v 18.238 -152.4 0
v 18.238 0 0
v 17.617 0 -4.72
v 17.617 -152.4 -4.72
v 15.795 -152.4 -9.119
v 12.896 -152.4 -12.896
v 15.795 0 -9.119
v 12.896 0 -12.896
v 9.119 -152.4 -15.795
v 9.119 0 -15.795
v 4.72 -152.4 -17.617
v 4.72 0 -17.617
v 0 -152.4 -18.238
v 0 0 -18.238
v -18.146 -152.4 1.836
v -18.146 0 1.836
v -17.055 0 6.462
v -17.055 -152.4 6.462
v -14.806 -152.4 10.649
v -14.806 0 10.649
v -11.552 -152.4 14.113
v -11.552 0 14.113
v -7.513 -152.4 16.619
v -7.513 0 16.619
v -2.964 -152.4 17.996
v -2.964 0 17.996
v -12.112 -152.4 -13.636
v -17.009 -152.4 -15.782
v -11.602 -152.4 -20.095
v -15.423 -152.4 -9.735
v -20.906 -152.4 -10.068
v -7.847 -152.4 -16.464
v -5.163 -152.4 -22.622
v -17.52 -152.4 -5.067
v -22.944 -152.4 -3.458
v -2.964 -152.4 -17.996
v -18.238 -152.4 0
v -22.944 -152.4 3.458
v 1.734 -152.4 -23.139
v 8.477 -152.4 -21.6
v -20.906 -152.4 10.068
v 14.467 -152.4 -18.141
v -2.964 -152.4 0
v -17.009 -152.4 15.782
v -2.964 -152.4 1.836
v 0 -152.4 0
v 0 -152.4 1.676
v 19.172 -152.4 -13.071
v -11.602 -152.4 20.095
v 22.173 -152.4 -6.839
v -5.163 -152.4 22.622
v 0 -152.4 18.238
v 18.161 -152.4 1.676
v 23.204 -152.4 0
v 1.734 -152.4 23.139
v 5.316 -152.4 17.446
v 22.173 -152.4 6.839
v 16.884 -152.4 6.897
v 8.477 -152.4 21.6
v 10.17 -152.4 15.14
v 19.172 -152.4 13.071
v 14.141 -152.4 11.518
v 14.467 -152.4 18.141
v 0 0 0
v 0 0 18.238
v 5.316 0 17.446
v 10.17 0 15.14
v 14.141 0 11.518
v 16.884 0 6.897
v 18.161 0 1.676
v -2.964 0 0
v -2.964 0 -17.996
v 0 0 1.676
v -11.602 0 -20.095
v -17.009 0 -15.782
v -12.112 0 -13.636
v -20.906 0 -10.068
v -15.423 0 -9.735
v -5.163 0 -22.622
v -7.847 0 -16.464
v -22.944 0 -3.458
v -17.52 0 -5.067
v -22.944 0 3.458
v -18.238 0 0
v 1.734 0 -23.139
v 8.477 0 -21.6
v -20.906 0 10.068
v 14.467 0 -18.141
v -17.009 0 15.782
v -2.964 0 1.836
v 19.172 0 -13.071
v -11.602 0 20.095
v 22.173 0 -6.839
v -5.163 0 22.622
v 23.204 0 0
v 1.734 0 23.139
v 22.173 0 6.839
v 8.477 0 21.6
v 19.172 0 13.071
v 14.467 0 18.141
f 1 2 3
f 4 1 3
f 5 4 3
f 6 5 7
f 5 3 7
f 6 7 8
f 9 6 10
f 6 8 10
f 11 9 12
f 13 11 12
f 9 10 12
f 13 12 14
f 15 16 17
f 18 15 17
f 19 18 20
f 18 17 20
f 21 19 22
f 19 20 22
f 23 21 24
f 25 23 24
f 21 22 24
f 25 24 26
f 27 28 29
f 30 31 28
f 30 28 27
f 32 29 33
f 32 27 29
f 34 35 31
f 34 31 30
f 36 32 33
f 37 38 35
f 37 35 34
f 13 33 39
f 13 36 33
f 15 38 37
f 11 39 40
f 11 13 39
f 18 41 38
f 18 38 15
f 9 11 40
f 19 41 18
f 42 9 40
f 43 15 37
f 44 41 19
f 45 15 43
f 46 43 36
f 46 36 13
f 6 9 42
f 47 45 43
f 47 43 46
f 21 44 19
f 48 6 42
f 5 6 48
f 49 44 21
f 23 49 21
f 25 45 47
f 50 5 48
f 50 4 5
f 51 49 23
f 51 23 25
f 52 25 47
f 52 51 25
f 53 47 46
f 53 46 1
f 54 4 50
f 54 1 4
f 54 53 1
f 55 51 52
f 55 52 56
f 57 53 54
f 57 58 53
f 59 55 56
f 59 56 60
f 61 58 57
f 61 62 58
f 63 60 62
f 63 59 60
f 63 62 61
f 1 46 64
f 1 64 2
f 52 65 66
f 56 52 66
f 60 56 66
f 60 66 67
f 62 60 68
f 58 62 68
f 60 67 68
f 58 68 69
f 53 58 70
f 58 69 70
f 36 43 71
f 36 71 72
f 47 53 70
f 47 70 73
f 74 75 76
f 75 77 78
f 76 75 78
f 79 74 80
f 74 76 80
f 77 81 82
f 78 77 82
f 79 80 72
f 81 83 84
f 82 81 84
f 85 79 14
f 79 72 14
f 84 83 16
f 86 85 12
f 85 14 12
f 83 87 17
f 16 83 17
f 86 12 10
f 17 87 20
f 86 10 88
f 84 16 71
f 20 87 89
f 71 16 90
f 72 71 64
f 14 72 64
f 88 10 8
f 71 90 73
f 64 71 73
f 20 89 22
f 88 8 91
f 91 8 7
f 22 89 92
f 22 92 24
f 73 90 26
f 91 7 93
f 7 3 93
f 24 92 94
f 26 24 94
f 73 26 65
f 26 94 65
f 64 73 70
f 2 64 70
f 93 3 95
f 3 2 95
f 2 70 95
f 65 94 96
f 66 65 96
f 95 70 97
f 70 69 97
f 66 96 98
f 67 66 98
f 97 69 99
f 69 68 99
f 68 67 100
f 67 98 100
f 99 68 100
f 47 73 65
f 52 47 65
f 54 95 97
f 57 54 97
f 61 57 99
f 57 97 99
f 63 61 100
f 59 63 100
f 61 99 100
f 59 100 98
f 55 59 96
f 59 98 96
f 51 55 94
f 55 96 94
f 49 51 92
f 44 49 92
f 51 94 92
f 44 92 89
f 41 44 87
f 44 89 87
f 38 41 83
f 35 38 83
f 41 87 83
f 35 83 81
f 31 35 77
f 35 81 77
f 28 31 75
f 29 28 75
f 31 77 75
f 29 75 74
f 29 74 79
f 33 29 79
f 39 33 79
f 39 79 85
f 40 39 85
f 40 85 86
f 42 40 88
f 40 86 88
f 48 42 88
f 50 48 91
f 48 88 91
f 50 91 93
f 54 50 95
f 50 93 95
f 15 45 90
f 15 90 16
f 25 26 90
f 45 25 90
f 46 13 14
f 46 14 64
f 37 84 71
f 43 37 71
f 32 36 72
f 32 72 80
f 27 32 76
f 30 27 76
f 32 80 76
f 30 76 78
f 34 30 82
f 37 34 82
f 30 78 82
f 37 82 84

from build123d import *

# Parameters (mm, degrees)
F0_R     = 23.20358
F1_DEPTH = 152.4


with BuildPart() as f1:
    # F0 (on Front) → F1 (new body)
    with BuildSketch(Plane.XZ):
        Circle(F0_R)
        with BuildLine():
            ThreePointArc((-2.96408, -17.995849), (-13.904967, -11.802045), (-18.238321, 0))
            Line((-18.238321, 0), (-2.96408, 0))
            Line((-2.96408, 0), (-2.96408, -17.995849))
        make_face(mode=Mode.SUBTRACT)
        with BuildLine():
            ThreePointArc((18.238321, 0), (12.89644, -12.89644), (0, -18.238321))
            Line((0, -18.238321), (0, 0))
            Line((0, 0), (18.238321, 0))
        make_face(mode=Mode.SUBTRACT)
        with BuildLine():
            ThreePointArc((-18.145688, 1.835854), (-13.292552, 12.487771), (-2.96408, 17.995849))
            Line((-2.96408, 17.995849), (-2.96408, 1.835854))
            Line((-2.96408, 1.835854), (-18.145688, 1.835854))
        make_face(mode=Mode.SUBTRACT)
        with BuildLine():
            Line((0, 3.556), (0, 18.238321))
            ThreePointArc((0, 18.238321), (12.289425, 13.476141), (18.161105, 1.676494))
            Line((18.161105, 1.676494), (0, 1.676494))
            Line((0, 1.676494), (0, 3.556))
        make_face(mode=Mode.SUBTRACT)
    extrude(amount=F1_DEPTH)


solid = f1.part
